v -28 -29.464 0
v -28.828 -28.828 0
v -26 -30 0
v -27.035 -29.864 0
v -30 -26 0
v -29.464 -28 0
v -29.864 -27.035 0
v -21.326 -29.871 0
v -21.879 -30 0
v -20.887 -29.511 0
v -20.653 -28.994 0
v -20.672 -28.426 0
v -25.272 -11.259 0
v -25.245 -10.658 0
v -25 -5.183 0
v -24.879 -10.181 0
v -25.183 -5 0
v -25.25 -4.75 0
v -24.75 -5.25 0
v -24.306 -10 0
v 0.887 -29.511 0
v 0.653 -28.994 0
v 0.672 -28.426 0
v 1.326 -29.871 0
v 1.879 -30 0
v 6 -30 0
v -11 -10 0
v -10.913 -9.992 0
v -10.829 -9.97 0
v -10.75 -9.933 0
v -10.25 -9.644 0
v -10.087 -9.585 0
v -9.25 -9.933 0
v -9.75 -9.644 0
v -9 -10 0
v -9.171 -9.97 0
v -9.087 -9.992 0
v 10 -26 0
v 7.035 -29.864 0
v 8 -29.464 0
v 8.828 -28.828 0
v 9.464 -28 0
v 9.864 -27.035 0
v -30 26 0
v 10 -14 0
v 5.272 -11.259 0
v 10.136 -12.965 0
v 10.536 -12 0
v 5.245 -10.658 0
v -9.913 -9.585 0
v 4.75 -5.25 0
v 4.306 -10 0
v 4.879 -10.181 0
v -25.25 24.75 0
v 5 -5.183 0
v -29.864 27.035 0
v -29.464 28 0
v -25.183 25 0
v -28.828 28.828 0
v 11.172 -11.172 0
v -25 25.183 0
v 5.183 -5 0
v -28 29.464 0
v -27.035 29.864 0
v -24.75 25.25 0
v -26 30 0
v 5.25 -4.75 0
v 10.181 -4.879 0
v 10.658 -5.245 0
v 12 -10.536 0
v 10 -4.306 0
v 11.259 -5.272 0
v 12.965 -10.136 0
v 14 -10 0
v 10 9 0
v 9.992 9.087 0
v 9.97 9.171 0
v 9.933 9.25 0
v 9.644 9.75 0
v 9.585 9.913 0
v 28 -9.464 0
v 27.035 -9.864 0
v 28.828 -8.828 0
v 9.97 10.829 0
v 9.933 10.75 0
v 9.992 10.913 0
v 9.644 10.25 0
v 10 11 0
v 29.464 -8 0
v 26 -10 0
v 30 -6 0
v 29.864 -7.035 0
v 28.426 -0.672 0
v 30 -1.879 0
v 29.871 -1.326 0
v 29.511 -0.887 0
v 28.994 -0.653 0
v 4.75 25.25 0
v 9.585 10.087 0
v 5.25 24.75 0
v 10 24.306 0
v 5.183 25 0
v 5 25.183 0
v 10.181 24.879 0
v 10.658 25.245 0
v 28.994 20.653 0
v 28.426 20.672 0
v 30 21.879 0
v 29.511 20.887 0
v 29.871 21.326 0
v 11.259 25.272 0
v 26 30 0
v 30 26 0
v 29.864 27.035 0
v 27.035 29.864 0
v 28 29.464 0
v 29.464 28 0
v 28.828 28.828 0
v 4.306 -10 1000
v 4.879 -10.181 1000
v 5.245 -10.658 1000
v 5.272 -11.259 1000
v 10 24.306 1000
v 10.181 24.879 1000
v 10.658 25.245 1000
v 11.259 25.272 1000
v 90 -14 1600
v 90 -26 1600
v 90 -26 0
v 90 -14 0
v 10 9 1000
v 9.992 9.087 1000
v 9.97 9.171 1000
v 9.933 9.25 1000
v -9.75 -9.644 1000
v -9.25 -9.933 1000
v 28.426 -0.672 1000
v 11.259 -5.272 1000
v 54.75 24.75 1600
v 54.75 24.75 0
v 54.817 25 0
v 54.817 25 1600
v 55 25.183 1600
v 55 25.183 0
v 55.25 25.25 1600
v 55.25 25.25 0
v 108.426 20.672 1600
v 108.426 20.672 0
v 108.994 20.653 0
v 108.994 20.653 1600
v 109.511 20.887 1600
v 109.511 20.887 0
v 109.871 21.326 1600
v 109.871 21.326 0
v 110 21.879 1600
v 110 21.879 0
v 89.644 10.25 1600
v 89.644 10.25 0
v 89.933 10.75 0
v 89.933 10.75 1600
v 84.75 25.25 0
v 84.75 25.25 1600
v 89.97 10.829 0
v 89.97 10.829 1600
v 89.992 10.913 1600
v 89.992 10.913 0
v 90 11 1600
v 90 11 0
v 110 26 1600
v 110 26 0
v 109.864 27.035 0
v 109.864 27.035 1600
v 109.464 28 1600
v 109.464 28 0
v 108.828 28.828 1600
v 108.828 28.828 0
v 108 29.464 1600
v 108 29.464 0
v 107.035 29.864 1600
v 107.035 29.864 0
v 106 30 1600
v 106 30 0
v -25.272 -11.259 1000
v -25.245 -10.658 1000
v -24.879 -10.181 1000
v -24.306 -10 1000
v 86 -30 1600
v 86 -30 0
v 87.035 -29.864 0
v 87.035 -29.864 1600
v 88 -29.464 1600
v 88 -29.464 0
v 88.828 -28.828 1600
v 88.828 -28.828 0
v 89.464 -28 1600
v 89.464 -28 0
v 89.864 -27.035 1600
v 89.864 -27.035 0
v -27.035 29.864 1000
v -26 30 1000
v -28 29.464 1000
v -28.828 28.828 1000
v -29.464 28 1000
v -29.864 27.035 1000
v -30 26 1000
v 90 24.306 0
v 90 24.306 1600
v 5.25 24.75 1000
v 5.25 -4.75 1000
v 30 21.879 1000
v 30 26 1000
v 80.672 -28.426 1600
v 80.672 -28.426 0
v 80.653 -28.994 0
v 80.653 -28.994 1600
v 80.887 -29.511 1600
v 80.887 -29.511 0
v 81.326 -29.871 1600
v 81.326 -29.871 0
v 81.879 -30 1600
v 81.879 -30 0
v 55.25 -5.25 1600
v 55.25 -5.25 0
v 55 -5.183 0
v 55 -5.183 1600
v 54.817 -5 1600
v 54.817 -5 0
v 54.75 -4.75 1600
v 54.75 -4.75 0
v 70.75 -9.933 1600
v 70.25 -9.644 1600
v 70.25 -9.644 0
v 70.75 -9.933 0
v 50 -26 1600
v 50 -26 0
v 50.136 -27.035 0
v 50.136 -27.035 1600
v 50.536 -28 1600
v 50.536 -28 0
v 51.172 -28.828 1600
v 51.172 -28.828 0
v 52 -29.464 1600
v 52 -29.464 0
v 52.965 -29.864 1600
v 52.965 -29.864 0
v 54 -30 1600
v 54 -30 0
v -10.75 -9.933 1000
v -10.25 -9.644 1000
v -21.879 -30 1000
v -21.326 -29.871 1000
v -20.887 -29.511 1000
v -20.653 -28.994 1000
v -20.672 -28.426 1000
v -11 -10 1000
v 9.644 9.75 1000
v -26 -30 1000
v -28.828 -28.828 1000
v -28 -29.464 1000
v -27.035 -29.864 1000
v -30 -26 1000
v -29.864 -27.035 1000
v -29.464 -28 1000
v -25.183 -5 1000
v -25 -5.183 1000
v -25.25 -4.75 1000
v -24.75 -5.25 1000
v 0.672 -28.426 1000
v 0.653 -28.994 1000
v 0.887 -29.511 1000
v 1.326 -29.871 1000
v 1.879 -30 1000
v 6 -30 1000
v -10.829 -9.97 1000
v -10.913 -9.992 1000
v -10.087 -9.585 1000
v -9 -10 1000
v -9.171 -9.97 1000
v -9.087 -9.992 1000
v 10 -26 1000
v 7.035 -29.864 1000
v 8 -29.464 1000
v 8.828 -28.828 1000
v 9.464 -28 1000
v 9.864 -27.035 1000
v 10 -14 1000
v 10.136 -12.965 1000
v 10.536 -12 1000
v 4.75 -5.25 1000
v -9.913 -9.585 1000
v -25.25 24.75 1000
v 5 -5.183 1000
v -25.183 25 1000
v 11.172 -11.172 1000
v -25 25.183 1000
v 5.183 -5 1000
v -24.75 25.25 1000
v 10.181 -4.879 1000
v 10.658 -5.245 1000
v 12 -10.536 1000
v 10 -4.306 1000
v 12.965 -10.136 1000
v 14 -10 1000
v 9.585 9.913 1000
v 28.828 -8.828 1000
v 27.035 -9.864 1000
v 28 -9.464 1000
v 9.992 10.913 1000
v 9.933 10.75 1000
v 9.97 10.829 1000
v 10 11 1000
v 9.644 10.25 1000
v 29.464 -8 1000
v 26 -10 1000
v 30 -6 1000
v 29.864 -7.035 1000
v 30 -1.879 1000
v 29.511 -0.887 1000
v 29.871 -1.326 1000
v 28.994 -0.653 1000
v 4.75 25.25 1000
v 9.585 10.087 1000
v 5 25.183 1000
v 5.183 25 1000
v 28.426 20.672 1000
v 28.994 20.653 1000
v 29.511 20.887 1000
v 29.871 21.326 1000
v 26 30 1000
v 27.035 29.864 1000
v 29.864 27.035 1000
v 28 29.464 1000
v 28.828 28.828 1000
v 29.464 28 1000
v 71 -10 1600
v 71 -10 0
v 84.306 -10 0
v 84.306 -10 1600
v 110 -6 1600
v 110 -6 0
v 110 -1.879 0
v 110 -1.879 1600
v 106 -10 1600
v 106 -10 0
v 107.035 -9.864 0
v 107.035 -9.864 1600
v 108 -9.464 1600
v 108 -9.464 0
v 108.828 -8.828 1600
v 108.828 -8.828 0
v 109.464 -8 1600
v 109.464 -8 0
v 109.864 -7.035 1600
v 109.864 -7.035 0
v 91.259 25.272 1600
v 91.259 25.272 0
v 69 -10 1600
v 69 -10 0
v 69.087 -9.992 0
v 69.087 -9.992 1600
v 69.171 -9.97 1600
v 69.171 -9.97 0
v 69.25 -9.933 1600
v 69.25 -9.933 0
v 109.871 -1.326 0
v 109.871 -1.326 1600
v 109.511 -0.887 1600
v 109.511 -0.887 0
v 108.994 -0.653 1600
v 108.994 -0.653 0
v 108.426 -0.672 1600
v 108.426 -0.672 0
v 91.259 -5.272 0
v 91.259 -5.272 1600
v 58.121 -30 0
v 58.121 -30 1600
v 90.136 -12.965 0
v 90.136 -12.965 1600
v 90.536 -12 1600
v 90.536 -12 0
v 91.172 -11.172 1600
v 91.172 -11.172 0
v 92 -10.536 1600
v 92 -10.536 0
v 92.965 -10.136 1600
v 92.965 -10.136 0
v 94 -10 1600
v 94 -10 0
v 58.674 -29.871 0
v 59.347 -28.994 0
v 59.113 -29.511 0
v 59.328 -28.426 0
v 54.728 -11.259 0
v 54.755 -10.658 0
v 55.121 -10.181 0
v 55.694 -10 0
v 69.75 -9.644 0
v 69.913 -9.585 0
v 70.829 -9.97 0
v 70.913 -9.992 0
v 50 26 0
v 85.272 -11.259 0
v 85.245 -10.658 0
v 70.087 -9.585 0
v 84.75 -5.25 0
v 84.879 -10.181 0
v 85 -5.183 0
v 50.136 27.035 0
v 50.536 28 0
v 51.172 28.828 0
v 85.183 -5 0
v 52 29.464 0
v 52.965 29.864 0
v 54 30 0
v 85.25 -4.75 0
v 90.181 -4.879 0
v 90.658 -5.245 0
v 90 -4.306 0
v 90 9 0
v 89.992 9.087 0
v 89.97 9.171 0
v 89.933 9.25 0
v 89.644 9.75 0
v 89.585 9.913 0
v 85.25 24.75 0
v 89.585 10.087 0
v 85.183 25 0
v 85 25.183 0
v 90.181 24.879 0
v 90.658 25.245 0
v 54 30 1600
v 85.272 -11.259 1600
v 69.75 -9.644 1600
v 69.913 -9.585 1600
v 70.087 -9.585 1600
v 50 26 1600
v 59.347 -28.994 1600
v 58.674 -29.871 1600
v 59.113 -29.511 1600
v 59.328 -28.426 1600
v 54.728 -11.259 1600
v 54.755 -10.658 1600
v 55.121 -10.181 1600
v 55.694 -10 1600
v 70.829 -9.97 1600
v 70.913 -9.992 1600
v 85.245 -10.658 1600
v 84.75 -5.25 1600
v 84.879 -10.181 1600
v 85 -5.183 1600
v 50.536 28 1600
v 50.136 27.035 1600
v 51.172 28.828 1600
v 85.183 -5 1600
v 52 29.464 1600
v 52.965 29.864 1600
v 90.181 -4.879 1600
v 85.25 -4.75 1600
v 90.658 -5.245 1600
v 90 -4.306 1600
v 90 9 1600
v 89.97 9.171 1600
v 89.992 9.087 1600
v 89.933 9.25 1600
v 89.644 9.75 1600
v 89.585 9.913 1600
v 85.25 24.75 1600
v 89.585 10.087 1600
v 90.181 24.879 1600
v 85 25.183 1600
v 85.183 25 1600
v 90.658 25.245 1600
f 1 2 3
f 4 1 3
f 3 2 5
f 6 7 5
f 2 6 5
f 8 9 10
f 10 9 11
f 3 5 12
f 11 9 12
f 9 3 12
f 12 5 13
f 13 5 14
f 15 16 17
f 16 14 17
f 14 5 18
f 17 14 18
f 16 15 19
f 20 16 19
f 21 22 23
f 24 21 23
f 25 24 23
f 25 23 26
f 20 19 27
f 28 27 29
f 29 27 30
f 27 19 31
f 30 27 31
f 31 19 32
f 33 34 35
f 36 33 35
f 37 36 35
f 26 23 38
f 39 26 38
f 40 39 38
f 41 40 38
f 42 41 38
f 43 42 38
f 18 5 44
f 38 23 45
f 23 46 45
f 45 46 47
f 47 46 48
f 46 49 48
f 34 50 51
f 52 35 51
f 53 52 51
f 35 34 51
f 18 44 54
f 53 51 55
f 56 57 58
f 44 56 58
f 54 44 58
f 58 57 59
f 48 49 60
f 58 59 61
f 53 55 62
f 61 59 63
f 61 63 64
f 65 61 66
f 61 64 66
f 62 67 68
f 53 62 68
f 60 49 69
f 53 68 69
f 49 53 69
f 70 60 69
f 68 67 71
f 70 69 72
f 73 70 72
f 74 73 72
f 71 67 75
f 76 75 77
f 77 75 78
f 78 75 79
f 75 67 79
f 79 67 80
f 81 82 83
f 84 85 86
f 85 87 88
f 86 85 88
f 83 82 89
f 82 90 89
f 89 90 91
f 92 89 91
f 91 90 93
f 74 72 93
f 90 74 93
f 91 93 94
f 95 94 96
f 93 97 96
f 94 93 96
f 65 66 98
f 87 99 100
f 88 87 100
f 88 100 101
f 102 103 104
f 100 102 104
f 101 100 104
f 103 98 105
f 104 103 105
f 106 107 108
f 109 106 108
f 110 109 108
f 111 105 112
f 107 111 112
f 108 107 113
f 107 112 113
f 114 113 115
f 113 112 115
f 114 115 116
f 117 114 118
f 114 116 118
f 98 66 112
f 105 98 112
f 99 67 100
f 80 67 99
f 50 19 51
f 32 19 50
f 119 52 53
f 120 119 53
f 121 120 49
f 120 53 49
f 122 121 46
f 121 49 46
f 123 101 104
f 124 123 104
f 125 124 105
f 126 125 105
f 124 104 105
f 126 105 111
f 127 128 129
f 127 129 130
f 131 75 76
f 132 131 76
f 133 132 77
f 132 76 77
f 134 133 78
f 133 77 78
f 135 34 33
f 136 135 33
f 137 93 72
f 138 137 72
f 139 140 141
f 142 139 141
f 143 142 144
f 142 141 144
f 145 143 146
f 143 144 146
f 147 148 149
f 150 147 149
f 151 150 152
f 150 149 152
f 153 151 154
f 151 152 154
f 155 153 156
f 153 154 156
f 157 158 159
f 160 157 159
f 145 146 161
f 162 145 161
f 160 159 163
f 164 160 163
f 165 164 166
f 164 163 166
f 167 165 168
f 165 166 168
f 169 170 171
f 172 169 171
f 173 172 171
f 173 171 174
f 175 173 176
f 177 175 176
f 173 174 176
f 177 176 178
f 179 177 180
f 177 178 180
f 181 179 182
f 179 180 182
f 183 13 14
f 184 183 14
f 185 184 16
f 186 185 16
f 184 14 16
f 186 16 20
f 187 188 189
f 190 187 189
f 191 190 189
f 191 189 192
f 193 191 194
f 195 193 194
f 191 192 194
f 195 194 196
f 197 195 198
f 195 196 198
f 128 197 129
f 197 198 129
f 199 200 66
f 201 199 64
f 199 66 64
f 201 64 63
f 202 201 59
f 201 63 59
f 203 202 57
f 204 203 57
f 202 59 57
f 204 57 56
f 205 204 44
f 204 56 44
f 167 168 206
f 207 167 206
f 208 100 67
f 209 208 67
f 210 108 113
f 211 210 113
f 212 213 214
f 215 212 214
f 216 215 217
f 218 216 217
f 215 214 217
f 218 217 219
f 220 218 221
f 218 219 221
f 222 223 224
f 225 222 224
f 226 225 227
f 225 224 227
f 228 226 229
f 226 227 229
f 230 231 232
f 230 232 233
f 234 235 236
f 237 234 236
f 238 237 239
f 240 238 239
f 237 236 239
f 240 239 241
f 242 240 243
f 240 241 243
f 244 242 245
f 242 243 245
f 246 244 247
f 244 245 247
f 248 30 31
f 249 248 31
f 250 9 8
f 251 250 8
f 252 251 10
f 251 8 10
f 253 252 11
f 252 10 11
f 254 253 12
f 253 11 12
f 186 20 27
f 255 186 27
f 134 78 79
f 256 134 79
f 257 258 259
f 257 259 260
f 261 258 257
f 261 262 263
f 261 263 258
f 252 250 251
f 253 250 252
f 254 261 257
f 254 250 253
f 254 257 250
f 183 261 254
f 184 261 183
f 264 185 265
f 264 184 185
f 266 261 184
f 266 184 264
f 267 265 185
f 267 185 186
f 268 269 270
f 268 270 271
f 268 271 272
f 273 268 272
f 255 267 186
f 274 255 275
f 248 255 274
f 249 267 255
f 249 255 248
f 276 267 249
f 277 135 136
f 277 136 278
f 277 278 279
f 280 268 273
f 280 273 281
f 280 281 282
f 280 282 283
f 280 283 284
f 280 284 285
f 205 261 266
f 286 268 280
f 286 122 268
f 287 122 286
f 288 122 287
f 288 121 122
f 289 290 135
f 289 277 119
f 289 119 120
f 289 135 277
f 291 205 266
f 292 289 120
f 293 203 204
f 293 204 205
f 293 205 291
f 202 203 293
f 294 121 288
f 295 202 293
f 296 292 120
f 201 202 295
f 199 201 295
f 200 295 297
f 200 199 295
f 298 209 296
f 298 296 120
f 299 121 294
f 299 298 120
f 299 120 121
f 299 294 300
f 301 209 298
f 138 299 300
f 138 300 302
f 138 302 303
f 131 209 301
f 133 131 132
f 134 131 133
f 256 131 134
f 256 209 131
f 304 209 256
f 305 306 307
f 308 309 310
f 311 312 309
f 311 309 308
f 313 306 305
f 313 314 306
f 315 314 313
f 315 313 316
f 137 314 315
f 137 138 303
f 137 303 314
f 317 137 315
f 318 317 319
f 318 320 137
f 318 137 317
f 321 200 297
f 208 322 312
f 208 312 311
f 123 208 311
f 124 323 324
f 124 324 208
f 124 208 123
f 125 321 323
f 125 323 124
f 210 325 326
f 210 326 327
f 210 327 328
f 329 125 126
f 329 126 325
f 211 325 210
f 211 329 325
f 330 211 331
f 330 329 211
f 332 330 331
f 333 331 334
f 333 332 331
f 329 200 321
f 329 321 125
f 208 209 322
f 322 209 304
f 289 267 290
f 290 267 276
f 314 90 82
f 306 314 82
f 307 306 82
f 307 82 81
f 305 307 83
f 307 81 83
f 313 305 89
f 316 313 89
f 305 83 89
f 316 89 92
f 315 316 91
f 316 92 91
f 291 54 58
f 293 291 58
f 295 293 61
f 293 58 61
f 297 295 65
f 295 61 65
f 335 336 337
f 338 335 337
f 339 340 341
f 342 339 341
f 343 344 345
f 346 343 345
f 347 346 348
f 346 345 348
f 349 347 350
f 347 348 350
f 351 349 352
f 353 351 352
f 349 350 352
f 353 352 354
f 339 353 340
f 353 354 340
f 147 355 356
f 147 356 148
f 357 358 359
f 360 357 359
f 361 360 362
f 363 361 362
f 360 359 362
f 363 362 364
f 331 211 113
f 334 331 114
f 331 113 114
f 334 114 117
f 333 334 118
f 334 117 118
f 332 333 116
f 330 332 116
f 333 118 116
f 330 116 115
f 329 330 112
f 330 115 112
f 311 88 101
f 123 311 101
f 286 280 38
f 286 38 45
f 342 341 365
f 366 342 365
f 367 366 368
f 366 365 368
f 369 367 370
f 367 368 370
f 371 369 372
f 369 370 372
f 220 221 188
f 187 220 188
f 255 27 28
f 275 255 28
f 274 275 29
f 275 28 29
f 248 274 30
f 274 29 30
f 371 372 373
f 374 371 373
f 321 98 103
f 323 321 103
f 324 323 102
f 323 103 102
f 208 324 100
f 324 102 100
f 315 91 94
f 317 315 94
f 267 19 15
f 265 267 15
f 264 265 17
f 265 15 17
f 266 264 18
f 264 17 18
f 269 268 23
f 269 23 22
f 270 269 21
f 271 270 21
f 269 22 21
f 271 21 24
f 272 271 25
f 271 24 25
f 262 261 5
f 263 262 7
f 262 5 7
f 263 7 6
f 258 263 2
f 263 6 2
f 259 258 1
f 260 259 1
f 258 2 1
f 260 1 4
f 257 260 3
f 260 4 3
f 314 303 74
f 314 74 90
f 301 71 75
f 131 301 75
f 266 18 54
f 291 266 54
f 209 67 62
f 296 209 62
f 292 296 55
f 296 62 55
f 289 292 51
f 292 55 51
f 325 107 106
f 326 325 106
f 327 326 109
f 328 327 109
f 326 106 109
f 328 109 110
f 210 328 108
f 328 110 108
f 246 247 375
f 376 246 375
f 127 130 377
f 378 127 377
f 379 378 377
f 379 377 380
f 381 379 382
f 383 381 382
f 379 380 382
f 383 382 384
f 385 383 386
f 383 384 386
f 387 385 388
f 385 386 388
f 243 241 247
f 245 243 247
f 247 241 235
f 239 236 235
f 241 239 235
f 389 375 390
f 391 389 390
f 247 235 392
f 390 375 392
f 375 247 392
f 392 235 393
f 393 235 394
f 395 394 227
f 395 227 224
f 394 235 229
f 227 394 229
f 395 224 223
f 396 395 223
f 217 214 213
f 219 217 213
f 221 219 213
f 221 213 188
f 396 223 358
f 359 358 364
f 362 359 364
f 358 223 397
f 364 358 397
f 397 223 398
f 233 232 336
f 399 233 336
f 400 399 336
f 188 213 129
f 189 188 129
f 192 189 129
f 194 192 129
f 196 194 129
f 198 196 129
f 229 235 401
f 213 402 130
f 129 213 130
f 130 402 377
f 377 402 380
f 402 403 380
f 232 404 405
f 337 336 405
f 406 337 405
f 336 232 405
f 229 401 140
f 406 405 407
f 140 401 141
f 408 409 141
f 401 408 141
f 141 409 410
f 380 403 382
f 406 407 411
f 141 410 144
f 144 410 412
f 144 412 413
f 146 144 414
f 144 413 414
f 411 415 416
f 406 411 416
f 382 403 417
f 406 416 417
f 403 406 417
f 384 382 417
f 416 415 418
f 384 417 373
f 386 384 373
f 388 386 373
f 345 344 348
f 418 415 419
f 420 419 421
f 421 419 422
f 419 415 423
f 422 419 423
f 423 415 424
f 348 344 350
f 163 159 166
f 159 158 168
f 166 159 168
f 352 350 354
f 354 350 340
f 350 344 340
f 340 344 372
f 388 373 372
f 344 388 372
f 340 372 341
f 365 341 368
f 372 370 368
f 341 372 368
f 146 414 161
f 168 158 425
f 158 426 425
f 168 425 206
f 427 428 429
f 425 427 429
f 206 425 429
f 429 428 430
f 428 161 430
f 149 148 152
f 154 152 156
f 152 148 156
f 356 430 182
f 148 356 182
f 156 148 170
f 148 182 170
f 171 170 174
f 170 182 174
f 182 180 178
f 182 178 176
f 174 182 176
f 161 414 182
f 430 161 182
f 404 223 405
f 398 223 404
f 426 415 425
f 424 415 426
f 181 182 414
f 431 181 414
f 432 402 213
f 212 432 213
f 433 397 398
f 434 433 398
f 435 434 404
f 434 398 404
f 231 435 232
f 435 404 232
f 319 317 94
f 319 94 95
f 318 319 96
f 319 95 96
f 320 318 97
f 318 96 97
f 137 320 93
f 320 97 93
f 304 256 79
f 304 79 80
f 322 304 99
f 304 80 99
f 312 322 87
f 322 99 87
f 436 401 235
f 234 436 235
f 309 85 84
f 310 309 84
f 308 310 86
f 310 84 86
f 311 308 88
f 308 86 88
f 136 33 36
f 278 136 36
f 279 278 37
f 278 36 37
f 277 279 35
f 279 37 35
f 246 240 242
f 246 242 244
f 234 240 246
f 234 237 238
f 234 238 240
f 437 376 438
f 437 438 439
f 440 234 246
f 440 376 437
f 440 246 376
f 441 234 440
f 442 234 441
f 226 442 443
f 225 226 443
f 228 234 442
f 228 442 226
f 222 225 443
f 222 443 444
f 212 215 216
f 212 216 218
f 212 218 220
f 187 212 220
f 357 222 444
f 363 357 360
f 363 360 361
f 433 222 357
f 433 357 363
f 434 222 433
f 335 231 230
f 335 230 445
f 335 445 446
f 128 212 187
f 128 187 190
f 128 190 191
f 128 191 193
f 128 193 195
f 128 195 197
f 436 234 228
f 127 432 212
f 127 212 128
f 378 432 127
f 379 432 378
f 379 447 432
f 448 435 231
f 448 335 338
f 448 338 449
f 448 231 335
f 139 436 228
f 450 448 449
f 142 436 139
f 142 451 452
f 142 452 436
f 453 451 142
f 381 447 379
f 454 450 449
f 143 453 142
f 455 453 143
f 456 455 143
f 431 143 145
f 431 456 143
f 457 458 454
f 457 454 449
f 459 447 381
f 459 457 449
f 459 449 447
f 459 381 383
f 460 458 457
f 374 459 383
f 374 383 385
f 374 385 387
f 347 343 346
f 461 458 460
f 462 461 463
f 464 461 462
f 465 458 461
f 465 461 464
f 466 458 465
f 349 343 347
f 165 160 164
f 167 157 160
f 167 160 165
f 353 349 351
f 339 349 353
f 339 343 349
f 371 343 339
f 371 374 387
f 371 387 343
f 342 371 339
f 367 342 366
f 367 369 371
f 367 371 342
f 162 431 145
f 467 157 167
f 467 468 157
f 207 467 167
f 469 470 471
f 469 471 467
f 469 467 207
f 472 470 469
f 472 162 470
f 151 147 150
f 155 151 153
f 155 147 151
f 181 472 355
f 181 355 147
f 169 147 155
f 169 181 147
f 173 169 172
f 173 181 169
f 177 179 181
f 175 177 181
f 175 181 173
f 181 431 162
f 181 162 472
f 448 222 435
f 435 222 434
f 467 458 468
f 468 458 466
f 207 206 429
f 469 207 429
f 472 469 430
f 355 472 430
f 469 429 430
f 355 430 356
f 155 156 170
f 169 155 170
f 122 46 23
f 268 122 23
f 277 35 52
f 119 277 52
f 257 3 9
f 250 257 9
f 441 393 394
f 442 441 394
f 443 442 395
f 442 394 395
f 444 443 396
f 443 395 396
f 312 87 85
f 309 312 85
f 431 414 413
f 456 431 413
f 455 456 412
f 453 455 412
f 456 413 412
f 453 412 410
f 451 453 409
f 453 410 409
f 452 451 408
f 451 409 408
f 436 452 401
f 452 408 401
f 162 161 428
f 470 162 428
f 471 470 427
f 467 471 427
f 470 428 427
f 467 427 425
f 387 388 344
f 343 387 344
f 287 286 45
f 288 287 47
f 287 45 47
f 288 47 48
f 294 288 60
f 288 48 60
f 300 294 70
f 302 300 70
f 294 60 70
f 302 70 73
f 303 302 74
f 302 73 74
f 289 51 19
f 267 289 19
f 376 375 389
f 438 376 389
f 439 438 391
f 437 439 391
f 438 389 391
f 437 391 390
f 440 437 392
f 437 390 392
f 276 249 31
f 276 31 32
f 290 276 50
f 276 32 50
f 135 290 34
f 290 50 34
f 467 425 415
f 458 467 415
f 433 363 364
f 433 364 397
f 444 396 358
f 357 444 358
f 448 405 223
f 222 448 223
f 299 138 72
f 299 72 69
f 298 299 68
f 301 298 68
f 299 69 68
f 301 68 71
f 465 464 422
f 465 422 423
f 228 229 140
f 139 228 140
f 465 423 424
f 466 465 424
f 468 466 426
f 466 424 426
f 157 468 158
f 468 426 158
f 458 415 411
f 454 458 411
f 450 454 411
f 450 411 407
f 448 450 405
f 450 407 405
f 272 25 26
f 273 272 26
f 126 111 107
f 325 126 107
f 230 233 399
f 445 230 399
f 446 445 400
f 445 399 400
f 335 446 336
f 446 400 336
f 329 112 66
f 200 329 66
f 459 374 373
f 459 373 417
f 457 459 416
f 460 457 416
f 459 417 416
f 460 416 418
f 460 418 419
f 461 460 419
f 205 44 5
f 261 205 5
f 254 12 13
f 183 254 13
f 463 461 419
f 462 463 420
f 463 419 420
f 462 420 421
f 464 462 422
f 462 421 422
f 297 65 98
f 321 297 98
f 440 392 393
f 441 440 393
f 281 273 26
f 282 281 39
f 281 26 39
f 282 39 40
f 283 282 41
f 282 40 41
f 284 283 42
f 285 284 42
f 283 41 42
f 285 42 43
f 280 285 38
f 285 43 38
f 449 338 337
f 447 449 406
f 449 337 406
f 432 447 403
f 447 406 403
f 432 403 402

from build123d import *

# Parameters (mm, degrees)
F1_DEPTH = 1000
F2_DEPTH = 1600


# Not quite as in the source:
# - ends of sketch curves that miss each other by under 0.0002 mm in the source are joined


with BuildPart() as f1:
    # F0 (on Top) → F1 (new body)
    with BuildSketch(Plane.XY):
        with BuildLine():
            ThreePointArc((30, -1.879032), (29.5109517857, -0.8873403242), (28.4264761923, -0.6716247175))
            Line((28.4264761923, -0.6716247175), (11.258819, -5.271684))
            ThreePointArc((11.258819, -5.271684), (10.3912385359, -5.0991113133), (10, -4.305758))
            Line((10, -4.305758), (10, 9))
            ThreePointArc((10, 9), (9.9829629324, 9.1294094506), (9.9330127764, 9.2499998709))
            Line((9.9330127764, 9.2499998709), (9.644338, 9.75))
            ThreePointArc((9.644338, 9.75), (9.57735, 10), (9.6443374736, 10.2500003039))
            Line((9.6443374736, 10.2500003039), (9.933013, 10.75))
            ThreePointArc((9.933013, 10.75), (9.9829629324, 10.8705905494), (10, 11))
            Line((10, 11), (10, 24.305758))
            ThreePointArc((10, 24.305758), (10.3912385359, 25.0991113133), (11.2588189596, 25.2716838492))
            Line((11.2588189596, 25.2716838492), (28.426476, 20.671624))
            ThreePointArc((28.426476, 20.671624), (29.5109517857, 20.8873403242), (30, 21.879032))
            Line((30, 21.879032), (30, 26))
            ThreePointArc((30, 26), (28.8284271247, 28.8284271247), (26, 30))
            Line((26, 30), (-26, 30))
            ThreePointArc((-26, 30), (-28.8284271247, 28.8284271247), (-30, 26))
            Line((-30, 26), (-30, -26))
            ThreePointArc((-30, -26), (-28.8284271247, -28.8284271247), (-26, -30))
            Line((-26, -30), (-21.879032, -30))
            ThreePointArc((-21.879032, -30), (-20.8873403242, -29.5109517857), (-20.6716247175, -28.4264761923))
            Line((-20.6716247175, -28.4264761923), (-25.271684, -11.258819))
            ThreePointArc((-25.271684, -11.258819), (-25.0991113133, -10.3912385359), (-24.305758, -10))
            Line((-24.305758, -10), (-11, -10))
            ThreePointArc((-11, -10), (-10.8705905494, -9.9829629324), (-10.7500001291, -9.9330127764))
            Line((-10.7500001291, -9.9330127764), (-10.25, -9.644338))
            ThreePointArc((-10.25, -9.644338), (-10, -9.57735), (-9.7499996961, -9.6443374736))
            Line((-9.7499996961, -9.6443374736), (-9.25, -9.933013))
            ThreePointArc((-9.25, -9.933013), (-9.1294094506, -9.9829629324), (-9, -10))
            Line((-9, -10), (4.305758, -10))
            ThreePointArc((4.305758, -10), (5.0991113133, -10.3912385359), (5.2716838492, -11.2588189596))
            Line((5.2716838492, -11.2588189596), (0.671624, -28.426476))
            ThreePointArc((0.671624, -28.426476), (0.8873403242, -29.5109517857), (1.879032, -30))
            Line((1.879032, -30), (6, -30))
            ThreePointArc((6, -30), (8.8284271247, -28.8284271247), (10, -26))
            Line((10, -26), (10, -14))
            ThreePointArc((10, -14), (11.1715728753, -11.1715728753), (14, -10))
            Line((14, -10), (26, -10))
            ThreePointArc((26, -10), (28.8284271247, -8.8284271247), (30, -6))
            Line((30, -6), (30, -1.879032))
        make_face()
        with BuildLine():
            Line((5.25, 24.75), (5.25, -4.75))
            ThreePointArc((5.25, -4.75), (5.1035533906, -5.1035533906), (4.75, -5.25))
            Line((4.75, -5.25), (-24.75, -5.25))
            ThreePointArc((-24.75, -5.25), (-25.1035533906, -5.1035533906), (-25.25, -4.75))
            Line((-25.25, -4.75), (-25.25, 24.75))
            ThreePointArc((-25.25, 24.75), (-25.1035533906, 25.1035533906), (-24.75, 25.25))
            Line((-24.75, 25.25), (4.75, 25.25))
            ThreePointArc((4.75, 25.25), (5.1035533906, 25.1035533906), (5.25, 24.75))
        make_face(mode=Mode.SUBTRACT)
    extrude(amount=F1_DEPTH)


with BuildPart() as f2:
    # F0 (on Top) → F2 (new body)
    with BuildSketch(Plane.XY):
        with BuildLine():
            ThreePointArc((110, -1.879032), (109.5109517857, -0.8873403242), (108.4264761923, -0.6716247175))
            Line((108.4264761923, -0.6716247175), (91.258819, -5.271684))
            ThreePointArc((91.258819, -5.271684), (90.3912385359, -5.0991113133), (90, -4.305758))
            Line((90, -4.305758), (90, 9))
            ThreePointArc((90, 9), (89.9829629324, 9.1294094506), (89.9330127764, 9.2499998709))
            Line((89.9330127764, 9.2499998709), (89.644338, 9.75))
            ThreePointArc((89.644338, 9.75), (89.57735, 10), (89.6443374736, 10.2500003039))
            Line((89.6443374736, 10.2500003039), (89.933013, 10.75))
            ThreePointArc((89.933013, 10.75), (89.9829629324, 10.8705905494), (90, 11))
            Line((90, 11), (90, 24.305758))
            ThreePointArc((90, 24.305758), (90.3912385359, 25.0991113133), (91.2588189596, 25.2716838492))
            Line((91.2588189596, 25.2716838492), (108.426476, 20.671624))
            ThreePointArc((108.426476, 20.671624), (109.5109517857, 20.8873403242), (110, 21.879032))
            Line((110, 21.879032), (110, 26))
            ThreePointArc((110, 26), (108.8284271247, 28.8284271247), (106, 30))
            Line((106, 30), (54, 30))
            ThreePointArc((54, 30), (51.1715728753, 28.8284271247), (50, 26))
            Line((50, 26), (50, -26))
            ThreePointArc((50, -26), (51.1715728753, -28.8284271247), (54, -30))
            Line((54, -30), (58.120968, -30))
            ThreePointArc((58.120968, -30), (59.1126596758, -29.5109517857), (59.3283752825, -28.4264761923))
            Line((59.3283752825, -28.4264761923), (54.728316, -11.258819))
            ThreePointArc((54.728316, -11.258819), (54.9008886867, -10.3912385359), (55.694242, -10))
            Line((55.694242, -10), (69, -10))
            ThreePointArc((69, -10), (69.1294094506, -9.9829629324), (69.2499998709, -9.9330127764))
            Line((69.2499998709, -9.9330127764), (69.75, -9.644338))
            ThreePointArc((69.75, -9.644338), (70, -9.57735), (70.2500003039, -9.6443374736))
            Line((70.2500003039, -9.6443374736), (70.75, -9.933013))
            ThreePointArc((70.75, -9.933013), (70.8705905494, -9.9829629324), (71, -10))
            Line((71, -10), (84.305758, -10))
            ThreePointArc((84.305758, -10), (85.0991113133, -10.3912385359), (85.2716838492, -11.2588189596))
            Line((85.2716838492, -11.2588189596), (80.671624, -28.426476))
            ThreePointArc((80.671624, -28.426476), (80.8873403242, -29.5109517857), (81.879032, -30))
            Line((81.879032, -30), (86, -30))
            ThreePointArc((86, -30), (88.8284271247, -28.8284271247), (90, -26))
            Line((90, -26), (90, -14))
            ThreePointArc((90, -14), (91.1715728753, -11.1715728753), (94, -10))
            Line((94, -10), (106, -10))
            ThreePointArc((106, -10), (108.8284271247, -8.8284271247), (110, -6))
            Line((110, -6), (110, -1.879032))
        make_face()
        with BuildLine():
            Line((84.75, -5.25), (55.25, -5.25))
            ThreePointArc((55.25, -5.25), (54.8964466094, -5.1035533906), (54.75, -4.75))
            Line((54.75, -4.75), (54.75, 24.75))
            ThreePointArc((54.75, 24.75), (54.8964466094, 25.1035533906), (55.25, 25.25))
            Line((55.25, 25.25), (84.75, 25.25))
            ThreePointArc((84.75, 25.25), (85.1035533906, 25.1035533906), (85.25, 24.75))
            Line((85.25, 24.75), (85.25, -4.75))
            ThreePointArc((85.25, -4.75), (85.1035533906, -5.1035533906), (84.75, -5.25))
        make_face(mode=Mode.SUBTRACT)
    extrude(amount=F2_DEPTH)


solid = Compound([f1.part, f2.part])
